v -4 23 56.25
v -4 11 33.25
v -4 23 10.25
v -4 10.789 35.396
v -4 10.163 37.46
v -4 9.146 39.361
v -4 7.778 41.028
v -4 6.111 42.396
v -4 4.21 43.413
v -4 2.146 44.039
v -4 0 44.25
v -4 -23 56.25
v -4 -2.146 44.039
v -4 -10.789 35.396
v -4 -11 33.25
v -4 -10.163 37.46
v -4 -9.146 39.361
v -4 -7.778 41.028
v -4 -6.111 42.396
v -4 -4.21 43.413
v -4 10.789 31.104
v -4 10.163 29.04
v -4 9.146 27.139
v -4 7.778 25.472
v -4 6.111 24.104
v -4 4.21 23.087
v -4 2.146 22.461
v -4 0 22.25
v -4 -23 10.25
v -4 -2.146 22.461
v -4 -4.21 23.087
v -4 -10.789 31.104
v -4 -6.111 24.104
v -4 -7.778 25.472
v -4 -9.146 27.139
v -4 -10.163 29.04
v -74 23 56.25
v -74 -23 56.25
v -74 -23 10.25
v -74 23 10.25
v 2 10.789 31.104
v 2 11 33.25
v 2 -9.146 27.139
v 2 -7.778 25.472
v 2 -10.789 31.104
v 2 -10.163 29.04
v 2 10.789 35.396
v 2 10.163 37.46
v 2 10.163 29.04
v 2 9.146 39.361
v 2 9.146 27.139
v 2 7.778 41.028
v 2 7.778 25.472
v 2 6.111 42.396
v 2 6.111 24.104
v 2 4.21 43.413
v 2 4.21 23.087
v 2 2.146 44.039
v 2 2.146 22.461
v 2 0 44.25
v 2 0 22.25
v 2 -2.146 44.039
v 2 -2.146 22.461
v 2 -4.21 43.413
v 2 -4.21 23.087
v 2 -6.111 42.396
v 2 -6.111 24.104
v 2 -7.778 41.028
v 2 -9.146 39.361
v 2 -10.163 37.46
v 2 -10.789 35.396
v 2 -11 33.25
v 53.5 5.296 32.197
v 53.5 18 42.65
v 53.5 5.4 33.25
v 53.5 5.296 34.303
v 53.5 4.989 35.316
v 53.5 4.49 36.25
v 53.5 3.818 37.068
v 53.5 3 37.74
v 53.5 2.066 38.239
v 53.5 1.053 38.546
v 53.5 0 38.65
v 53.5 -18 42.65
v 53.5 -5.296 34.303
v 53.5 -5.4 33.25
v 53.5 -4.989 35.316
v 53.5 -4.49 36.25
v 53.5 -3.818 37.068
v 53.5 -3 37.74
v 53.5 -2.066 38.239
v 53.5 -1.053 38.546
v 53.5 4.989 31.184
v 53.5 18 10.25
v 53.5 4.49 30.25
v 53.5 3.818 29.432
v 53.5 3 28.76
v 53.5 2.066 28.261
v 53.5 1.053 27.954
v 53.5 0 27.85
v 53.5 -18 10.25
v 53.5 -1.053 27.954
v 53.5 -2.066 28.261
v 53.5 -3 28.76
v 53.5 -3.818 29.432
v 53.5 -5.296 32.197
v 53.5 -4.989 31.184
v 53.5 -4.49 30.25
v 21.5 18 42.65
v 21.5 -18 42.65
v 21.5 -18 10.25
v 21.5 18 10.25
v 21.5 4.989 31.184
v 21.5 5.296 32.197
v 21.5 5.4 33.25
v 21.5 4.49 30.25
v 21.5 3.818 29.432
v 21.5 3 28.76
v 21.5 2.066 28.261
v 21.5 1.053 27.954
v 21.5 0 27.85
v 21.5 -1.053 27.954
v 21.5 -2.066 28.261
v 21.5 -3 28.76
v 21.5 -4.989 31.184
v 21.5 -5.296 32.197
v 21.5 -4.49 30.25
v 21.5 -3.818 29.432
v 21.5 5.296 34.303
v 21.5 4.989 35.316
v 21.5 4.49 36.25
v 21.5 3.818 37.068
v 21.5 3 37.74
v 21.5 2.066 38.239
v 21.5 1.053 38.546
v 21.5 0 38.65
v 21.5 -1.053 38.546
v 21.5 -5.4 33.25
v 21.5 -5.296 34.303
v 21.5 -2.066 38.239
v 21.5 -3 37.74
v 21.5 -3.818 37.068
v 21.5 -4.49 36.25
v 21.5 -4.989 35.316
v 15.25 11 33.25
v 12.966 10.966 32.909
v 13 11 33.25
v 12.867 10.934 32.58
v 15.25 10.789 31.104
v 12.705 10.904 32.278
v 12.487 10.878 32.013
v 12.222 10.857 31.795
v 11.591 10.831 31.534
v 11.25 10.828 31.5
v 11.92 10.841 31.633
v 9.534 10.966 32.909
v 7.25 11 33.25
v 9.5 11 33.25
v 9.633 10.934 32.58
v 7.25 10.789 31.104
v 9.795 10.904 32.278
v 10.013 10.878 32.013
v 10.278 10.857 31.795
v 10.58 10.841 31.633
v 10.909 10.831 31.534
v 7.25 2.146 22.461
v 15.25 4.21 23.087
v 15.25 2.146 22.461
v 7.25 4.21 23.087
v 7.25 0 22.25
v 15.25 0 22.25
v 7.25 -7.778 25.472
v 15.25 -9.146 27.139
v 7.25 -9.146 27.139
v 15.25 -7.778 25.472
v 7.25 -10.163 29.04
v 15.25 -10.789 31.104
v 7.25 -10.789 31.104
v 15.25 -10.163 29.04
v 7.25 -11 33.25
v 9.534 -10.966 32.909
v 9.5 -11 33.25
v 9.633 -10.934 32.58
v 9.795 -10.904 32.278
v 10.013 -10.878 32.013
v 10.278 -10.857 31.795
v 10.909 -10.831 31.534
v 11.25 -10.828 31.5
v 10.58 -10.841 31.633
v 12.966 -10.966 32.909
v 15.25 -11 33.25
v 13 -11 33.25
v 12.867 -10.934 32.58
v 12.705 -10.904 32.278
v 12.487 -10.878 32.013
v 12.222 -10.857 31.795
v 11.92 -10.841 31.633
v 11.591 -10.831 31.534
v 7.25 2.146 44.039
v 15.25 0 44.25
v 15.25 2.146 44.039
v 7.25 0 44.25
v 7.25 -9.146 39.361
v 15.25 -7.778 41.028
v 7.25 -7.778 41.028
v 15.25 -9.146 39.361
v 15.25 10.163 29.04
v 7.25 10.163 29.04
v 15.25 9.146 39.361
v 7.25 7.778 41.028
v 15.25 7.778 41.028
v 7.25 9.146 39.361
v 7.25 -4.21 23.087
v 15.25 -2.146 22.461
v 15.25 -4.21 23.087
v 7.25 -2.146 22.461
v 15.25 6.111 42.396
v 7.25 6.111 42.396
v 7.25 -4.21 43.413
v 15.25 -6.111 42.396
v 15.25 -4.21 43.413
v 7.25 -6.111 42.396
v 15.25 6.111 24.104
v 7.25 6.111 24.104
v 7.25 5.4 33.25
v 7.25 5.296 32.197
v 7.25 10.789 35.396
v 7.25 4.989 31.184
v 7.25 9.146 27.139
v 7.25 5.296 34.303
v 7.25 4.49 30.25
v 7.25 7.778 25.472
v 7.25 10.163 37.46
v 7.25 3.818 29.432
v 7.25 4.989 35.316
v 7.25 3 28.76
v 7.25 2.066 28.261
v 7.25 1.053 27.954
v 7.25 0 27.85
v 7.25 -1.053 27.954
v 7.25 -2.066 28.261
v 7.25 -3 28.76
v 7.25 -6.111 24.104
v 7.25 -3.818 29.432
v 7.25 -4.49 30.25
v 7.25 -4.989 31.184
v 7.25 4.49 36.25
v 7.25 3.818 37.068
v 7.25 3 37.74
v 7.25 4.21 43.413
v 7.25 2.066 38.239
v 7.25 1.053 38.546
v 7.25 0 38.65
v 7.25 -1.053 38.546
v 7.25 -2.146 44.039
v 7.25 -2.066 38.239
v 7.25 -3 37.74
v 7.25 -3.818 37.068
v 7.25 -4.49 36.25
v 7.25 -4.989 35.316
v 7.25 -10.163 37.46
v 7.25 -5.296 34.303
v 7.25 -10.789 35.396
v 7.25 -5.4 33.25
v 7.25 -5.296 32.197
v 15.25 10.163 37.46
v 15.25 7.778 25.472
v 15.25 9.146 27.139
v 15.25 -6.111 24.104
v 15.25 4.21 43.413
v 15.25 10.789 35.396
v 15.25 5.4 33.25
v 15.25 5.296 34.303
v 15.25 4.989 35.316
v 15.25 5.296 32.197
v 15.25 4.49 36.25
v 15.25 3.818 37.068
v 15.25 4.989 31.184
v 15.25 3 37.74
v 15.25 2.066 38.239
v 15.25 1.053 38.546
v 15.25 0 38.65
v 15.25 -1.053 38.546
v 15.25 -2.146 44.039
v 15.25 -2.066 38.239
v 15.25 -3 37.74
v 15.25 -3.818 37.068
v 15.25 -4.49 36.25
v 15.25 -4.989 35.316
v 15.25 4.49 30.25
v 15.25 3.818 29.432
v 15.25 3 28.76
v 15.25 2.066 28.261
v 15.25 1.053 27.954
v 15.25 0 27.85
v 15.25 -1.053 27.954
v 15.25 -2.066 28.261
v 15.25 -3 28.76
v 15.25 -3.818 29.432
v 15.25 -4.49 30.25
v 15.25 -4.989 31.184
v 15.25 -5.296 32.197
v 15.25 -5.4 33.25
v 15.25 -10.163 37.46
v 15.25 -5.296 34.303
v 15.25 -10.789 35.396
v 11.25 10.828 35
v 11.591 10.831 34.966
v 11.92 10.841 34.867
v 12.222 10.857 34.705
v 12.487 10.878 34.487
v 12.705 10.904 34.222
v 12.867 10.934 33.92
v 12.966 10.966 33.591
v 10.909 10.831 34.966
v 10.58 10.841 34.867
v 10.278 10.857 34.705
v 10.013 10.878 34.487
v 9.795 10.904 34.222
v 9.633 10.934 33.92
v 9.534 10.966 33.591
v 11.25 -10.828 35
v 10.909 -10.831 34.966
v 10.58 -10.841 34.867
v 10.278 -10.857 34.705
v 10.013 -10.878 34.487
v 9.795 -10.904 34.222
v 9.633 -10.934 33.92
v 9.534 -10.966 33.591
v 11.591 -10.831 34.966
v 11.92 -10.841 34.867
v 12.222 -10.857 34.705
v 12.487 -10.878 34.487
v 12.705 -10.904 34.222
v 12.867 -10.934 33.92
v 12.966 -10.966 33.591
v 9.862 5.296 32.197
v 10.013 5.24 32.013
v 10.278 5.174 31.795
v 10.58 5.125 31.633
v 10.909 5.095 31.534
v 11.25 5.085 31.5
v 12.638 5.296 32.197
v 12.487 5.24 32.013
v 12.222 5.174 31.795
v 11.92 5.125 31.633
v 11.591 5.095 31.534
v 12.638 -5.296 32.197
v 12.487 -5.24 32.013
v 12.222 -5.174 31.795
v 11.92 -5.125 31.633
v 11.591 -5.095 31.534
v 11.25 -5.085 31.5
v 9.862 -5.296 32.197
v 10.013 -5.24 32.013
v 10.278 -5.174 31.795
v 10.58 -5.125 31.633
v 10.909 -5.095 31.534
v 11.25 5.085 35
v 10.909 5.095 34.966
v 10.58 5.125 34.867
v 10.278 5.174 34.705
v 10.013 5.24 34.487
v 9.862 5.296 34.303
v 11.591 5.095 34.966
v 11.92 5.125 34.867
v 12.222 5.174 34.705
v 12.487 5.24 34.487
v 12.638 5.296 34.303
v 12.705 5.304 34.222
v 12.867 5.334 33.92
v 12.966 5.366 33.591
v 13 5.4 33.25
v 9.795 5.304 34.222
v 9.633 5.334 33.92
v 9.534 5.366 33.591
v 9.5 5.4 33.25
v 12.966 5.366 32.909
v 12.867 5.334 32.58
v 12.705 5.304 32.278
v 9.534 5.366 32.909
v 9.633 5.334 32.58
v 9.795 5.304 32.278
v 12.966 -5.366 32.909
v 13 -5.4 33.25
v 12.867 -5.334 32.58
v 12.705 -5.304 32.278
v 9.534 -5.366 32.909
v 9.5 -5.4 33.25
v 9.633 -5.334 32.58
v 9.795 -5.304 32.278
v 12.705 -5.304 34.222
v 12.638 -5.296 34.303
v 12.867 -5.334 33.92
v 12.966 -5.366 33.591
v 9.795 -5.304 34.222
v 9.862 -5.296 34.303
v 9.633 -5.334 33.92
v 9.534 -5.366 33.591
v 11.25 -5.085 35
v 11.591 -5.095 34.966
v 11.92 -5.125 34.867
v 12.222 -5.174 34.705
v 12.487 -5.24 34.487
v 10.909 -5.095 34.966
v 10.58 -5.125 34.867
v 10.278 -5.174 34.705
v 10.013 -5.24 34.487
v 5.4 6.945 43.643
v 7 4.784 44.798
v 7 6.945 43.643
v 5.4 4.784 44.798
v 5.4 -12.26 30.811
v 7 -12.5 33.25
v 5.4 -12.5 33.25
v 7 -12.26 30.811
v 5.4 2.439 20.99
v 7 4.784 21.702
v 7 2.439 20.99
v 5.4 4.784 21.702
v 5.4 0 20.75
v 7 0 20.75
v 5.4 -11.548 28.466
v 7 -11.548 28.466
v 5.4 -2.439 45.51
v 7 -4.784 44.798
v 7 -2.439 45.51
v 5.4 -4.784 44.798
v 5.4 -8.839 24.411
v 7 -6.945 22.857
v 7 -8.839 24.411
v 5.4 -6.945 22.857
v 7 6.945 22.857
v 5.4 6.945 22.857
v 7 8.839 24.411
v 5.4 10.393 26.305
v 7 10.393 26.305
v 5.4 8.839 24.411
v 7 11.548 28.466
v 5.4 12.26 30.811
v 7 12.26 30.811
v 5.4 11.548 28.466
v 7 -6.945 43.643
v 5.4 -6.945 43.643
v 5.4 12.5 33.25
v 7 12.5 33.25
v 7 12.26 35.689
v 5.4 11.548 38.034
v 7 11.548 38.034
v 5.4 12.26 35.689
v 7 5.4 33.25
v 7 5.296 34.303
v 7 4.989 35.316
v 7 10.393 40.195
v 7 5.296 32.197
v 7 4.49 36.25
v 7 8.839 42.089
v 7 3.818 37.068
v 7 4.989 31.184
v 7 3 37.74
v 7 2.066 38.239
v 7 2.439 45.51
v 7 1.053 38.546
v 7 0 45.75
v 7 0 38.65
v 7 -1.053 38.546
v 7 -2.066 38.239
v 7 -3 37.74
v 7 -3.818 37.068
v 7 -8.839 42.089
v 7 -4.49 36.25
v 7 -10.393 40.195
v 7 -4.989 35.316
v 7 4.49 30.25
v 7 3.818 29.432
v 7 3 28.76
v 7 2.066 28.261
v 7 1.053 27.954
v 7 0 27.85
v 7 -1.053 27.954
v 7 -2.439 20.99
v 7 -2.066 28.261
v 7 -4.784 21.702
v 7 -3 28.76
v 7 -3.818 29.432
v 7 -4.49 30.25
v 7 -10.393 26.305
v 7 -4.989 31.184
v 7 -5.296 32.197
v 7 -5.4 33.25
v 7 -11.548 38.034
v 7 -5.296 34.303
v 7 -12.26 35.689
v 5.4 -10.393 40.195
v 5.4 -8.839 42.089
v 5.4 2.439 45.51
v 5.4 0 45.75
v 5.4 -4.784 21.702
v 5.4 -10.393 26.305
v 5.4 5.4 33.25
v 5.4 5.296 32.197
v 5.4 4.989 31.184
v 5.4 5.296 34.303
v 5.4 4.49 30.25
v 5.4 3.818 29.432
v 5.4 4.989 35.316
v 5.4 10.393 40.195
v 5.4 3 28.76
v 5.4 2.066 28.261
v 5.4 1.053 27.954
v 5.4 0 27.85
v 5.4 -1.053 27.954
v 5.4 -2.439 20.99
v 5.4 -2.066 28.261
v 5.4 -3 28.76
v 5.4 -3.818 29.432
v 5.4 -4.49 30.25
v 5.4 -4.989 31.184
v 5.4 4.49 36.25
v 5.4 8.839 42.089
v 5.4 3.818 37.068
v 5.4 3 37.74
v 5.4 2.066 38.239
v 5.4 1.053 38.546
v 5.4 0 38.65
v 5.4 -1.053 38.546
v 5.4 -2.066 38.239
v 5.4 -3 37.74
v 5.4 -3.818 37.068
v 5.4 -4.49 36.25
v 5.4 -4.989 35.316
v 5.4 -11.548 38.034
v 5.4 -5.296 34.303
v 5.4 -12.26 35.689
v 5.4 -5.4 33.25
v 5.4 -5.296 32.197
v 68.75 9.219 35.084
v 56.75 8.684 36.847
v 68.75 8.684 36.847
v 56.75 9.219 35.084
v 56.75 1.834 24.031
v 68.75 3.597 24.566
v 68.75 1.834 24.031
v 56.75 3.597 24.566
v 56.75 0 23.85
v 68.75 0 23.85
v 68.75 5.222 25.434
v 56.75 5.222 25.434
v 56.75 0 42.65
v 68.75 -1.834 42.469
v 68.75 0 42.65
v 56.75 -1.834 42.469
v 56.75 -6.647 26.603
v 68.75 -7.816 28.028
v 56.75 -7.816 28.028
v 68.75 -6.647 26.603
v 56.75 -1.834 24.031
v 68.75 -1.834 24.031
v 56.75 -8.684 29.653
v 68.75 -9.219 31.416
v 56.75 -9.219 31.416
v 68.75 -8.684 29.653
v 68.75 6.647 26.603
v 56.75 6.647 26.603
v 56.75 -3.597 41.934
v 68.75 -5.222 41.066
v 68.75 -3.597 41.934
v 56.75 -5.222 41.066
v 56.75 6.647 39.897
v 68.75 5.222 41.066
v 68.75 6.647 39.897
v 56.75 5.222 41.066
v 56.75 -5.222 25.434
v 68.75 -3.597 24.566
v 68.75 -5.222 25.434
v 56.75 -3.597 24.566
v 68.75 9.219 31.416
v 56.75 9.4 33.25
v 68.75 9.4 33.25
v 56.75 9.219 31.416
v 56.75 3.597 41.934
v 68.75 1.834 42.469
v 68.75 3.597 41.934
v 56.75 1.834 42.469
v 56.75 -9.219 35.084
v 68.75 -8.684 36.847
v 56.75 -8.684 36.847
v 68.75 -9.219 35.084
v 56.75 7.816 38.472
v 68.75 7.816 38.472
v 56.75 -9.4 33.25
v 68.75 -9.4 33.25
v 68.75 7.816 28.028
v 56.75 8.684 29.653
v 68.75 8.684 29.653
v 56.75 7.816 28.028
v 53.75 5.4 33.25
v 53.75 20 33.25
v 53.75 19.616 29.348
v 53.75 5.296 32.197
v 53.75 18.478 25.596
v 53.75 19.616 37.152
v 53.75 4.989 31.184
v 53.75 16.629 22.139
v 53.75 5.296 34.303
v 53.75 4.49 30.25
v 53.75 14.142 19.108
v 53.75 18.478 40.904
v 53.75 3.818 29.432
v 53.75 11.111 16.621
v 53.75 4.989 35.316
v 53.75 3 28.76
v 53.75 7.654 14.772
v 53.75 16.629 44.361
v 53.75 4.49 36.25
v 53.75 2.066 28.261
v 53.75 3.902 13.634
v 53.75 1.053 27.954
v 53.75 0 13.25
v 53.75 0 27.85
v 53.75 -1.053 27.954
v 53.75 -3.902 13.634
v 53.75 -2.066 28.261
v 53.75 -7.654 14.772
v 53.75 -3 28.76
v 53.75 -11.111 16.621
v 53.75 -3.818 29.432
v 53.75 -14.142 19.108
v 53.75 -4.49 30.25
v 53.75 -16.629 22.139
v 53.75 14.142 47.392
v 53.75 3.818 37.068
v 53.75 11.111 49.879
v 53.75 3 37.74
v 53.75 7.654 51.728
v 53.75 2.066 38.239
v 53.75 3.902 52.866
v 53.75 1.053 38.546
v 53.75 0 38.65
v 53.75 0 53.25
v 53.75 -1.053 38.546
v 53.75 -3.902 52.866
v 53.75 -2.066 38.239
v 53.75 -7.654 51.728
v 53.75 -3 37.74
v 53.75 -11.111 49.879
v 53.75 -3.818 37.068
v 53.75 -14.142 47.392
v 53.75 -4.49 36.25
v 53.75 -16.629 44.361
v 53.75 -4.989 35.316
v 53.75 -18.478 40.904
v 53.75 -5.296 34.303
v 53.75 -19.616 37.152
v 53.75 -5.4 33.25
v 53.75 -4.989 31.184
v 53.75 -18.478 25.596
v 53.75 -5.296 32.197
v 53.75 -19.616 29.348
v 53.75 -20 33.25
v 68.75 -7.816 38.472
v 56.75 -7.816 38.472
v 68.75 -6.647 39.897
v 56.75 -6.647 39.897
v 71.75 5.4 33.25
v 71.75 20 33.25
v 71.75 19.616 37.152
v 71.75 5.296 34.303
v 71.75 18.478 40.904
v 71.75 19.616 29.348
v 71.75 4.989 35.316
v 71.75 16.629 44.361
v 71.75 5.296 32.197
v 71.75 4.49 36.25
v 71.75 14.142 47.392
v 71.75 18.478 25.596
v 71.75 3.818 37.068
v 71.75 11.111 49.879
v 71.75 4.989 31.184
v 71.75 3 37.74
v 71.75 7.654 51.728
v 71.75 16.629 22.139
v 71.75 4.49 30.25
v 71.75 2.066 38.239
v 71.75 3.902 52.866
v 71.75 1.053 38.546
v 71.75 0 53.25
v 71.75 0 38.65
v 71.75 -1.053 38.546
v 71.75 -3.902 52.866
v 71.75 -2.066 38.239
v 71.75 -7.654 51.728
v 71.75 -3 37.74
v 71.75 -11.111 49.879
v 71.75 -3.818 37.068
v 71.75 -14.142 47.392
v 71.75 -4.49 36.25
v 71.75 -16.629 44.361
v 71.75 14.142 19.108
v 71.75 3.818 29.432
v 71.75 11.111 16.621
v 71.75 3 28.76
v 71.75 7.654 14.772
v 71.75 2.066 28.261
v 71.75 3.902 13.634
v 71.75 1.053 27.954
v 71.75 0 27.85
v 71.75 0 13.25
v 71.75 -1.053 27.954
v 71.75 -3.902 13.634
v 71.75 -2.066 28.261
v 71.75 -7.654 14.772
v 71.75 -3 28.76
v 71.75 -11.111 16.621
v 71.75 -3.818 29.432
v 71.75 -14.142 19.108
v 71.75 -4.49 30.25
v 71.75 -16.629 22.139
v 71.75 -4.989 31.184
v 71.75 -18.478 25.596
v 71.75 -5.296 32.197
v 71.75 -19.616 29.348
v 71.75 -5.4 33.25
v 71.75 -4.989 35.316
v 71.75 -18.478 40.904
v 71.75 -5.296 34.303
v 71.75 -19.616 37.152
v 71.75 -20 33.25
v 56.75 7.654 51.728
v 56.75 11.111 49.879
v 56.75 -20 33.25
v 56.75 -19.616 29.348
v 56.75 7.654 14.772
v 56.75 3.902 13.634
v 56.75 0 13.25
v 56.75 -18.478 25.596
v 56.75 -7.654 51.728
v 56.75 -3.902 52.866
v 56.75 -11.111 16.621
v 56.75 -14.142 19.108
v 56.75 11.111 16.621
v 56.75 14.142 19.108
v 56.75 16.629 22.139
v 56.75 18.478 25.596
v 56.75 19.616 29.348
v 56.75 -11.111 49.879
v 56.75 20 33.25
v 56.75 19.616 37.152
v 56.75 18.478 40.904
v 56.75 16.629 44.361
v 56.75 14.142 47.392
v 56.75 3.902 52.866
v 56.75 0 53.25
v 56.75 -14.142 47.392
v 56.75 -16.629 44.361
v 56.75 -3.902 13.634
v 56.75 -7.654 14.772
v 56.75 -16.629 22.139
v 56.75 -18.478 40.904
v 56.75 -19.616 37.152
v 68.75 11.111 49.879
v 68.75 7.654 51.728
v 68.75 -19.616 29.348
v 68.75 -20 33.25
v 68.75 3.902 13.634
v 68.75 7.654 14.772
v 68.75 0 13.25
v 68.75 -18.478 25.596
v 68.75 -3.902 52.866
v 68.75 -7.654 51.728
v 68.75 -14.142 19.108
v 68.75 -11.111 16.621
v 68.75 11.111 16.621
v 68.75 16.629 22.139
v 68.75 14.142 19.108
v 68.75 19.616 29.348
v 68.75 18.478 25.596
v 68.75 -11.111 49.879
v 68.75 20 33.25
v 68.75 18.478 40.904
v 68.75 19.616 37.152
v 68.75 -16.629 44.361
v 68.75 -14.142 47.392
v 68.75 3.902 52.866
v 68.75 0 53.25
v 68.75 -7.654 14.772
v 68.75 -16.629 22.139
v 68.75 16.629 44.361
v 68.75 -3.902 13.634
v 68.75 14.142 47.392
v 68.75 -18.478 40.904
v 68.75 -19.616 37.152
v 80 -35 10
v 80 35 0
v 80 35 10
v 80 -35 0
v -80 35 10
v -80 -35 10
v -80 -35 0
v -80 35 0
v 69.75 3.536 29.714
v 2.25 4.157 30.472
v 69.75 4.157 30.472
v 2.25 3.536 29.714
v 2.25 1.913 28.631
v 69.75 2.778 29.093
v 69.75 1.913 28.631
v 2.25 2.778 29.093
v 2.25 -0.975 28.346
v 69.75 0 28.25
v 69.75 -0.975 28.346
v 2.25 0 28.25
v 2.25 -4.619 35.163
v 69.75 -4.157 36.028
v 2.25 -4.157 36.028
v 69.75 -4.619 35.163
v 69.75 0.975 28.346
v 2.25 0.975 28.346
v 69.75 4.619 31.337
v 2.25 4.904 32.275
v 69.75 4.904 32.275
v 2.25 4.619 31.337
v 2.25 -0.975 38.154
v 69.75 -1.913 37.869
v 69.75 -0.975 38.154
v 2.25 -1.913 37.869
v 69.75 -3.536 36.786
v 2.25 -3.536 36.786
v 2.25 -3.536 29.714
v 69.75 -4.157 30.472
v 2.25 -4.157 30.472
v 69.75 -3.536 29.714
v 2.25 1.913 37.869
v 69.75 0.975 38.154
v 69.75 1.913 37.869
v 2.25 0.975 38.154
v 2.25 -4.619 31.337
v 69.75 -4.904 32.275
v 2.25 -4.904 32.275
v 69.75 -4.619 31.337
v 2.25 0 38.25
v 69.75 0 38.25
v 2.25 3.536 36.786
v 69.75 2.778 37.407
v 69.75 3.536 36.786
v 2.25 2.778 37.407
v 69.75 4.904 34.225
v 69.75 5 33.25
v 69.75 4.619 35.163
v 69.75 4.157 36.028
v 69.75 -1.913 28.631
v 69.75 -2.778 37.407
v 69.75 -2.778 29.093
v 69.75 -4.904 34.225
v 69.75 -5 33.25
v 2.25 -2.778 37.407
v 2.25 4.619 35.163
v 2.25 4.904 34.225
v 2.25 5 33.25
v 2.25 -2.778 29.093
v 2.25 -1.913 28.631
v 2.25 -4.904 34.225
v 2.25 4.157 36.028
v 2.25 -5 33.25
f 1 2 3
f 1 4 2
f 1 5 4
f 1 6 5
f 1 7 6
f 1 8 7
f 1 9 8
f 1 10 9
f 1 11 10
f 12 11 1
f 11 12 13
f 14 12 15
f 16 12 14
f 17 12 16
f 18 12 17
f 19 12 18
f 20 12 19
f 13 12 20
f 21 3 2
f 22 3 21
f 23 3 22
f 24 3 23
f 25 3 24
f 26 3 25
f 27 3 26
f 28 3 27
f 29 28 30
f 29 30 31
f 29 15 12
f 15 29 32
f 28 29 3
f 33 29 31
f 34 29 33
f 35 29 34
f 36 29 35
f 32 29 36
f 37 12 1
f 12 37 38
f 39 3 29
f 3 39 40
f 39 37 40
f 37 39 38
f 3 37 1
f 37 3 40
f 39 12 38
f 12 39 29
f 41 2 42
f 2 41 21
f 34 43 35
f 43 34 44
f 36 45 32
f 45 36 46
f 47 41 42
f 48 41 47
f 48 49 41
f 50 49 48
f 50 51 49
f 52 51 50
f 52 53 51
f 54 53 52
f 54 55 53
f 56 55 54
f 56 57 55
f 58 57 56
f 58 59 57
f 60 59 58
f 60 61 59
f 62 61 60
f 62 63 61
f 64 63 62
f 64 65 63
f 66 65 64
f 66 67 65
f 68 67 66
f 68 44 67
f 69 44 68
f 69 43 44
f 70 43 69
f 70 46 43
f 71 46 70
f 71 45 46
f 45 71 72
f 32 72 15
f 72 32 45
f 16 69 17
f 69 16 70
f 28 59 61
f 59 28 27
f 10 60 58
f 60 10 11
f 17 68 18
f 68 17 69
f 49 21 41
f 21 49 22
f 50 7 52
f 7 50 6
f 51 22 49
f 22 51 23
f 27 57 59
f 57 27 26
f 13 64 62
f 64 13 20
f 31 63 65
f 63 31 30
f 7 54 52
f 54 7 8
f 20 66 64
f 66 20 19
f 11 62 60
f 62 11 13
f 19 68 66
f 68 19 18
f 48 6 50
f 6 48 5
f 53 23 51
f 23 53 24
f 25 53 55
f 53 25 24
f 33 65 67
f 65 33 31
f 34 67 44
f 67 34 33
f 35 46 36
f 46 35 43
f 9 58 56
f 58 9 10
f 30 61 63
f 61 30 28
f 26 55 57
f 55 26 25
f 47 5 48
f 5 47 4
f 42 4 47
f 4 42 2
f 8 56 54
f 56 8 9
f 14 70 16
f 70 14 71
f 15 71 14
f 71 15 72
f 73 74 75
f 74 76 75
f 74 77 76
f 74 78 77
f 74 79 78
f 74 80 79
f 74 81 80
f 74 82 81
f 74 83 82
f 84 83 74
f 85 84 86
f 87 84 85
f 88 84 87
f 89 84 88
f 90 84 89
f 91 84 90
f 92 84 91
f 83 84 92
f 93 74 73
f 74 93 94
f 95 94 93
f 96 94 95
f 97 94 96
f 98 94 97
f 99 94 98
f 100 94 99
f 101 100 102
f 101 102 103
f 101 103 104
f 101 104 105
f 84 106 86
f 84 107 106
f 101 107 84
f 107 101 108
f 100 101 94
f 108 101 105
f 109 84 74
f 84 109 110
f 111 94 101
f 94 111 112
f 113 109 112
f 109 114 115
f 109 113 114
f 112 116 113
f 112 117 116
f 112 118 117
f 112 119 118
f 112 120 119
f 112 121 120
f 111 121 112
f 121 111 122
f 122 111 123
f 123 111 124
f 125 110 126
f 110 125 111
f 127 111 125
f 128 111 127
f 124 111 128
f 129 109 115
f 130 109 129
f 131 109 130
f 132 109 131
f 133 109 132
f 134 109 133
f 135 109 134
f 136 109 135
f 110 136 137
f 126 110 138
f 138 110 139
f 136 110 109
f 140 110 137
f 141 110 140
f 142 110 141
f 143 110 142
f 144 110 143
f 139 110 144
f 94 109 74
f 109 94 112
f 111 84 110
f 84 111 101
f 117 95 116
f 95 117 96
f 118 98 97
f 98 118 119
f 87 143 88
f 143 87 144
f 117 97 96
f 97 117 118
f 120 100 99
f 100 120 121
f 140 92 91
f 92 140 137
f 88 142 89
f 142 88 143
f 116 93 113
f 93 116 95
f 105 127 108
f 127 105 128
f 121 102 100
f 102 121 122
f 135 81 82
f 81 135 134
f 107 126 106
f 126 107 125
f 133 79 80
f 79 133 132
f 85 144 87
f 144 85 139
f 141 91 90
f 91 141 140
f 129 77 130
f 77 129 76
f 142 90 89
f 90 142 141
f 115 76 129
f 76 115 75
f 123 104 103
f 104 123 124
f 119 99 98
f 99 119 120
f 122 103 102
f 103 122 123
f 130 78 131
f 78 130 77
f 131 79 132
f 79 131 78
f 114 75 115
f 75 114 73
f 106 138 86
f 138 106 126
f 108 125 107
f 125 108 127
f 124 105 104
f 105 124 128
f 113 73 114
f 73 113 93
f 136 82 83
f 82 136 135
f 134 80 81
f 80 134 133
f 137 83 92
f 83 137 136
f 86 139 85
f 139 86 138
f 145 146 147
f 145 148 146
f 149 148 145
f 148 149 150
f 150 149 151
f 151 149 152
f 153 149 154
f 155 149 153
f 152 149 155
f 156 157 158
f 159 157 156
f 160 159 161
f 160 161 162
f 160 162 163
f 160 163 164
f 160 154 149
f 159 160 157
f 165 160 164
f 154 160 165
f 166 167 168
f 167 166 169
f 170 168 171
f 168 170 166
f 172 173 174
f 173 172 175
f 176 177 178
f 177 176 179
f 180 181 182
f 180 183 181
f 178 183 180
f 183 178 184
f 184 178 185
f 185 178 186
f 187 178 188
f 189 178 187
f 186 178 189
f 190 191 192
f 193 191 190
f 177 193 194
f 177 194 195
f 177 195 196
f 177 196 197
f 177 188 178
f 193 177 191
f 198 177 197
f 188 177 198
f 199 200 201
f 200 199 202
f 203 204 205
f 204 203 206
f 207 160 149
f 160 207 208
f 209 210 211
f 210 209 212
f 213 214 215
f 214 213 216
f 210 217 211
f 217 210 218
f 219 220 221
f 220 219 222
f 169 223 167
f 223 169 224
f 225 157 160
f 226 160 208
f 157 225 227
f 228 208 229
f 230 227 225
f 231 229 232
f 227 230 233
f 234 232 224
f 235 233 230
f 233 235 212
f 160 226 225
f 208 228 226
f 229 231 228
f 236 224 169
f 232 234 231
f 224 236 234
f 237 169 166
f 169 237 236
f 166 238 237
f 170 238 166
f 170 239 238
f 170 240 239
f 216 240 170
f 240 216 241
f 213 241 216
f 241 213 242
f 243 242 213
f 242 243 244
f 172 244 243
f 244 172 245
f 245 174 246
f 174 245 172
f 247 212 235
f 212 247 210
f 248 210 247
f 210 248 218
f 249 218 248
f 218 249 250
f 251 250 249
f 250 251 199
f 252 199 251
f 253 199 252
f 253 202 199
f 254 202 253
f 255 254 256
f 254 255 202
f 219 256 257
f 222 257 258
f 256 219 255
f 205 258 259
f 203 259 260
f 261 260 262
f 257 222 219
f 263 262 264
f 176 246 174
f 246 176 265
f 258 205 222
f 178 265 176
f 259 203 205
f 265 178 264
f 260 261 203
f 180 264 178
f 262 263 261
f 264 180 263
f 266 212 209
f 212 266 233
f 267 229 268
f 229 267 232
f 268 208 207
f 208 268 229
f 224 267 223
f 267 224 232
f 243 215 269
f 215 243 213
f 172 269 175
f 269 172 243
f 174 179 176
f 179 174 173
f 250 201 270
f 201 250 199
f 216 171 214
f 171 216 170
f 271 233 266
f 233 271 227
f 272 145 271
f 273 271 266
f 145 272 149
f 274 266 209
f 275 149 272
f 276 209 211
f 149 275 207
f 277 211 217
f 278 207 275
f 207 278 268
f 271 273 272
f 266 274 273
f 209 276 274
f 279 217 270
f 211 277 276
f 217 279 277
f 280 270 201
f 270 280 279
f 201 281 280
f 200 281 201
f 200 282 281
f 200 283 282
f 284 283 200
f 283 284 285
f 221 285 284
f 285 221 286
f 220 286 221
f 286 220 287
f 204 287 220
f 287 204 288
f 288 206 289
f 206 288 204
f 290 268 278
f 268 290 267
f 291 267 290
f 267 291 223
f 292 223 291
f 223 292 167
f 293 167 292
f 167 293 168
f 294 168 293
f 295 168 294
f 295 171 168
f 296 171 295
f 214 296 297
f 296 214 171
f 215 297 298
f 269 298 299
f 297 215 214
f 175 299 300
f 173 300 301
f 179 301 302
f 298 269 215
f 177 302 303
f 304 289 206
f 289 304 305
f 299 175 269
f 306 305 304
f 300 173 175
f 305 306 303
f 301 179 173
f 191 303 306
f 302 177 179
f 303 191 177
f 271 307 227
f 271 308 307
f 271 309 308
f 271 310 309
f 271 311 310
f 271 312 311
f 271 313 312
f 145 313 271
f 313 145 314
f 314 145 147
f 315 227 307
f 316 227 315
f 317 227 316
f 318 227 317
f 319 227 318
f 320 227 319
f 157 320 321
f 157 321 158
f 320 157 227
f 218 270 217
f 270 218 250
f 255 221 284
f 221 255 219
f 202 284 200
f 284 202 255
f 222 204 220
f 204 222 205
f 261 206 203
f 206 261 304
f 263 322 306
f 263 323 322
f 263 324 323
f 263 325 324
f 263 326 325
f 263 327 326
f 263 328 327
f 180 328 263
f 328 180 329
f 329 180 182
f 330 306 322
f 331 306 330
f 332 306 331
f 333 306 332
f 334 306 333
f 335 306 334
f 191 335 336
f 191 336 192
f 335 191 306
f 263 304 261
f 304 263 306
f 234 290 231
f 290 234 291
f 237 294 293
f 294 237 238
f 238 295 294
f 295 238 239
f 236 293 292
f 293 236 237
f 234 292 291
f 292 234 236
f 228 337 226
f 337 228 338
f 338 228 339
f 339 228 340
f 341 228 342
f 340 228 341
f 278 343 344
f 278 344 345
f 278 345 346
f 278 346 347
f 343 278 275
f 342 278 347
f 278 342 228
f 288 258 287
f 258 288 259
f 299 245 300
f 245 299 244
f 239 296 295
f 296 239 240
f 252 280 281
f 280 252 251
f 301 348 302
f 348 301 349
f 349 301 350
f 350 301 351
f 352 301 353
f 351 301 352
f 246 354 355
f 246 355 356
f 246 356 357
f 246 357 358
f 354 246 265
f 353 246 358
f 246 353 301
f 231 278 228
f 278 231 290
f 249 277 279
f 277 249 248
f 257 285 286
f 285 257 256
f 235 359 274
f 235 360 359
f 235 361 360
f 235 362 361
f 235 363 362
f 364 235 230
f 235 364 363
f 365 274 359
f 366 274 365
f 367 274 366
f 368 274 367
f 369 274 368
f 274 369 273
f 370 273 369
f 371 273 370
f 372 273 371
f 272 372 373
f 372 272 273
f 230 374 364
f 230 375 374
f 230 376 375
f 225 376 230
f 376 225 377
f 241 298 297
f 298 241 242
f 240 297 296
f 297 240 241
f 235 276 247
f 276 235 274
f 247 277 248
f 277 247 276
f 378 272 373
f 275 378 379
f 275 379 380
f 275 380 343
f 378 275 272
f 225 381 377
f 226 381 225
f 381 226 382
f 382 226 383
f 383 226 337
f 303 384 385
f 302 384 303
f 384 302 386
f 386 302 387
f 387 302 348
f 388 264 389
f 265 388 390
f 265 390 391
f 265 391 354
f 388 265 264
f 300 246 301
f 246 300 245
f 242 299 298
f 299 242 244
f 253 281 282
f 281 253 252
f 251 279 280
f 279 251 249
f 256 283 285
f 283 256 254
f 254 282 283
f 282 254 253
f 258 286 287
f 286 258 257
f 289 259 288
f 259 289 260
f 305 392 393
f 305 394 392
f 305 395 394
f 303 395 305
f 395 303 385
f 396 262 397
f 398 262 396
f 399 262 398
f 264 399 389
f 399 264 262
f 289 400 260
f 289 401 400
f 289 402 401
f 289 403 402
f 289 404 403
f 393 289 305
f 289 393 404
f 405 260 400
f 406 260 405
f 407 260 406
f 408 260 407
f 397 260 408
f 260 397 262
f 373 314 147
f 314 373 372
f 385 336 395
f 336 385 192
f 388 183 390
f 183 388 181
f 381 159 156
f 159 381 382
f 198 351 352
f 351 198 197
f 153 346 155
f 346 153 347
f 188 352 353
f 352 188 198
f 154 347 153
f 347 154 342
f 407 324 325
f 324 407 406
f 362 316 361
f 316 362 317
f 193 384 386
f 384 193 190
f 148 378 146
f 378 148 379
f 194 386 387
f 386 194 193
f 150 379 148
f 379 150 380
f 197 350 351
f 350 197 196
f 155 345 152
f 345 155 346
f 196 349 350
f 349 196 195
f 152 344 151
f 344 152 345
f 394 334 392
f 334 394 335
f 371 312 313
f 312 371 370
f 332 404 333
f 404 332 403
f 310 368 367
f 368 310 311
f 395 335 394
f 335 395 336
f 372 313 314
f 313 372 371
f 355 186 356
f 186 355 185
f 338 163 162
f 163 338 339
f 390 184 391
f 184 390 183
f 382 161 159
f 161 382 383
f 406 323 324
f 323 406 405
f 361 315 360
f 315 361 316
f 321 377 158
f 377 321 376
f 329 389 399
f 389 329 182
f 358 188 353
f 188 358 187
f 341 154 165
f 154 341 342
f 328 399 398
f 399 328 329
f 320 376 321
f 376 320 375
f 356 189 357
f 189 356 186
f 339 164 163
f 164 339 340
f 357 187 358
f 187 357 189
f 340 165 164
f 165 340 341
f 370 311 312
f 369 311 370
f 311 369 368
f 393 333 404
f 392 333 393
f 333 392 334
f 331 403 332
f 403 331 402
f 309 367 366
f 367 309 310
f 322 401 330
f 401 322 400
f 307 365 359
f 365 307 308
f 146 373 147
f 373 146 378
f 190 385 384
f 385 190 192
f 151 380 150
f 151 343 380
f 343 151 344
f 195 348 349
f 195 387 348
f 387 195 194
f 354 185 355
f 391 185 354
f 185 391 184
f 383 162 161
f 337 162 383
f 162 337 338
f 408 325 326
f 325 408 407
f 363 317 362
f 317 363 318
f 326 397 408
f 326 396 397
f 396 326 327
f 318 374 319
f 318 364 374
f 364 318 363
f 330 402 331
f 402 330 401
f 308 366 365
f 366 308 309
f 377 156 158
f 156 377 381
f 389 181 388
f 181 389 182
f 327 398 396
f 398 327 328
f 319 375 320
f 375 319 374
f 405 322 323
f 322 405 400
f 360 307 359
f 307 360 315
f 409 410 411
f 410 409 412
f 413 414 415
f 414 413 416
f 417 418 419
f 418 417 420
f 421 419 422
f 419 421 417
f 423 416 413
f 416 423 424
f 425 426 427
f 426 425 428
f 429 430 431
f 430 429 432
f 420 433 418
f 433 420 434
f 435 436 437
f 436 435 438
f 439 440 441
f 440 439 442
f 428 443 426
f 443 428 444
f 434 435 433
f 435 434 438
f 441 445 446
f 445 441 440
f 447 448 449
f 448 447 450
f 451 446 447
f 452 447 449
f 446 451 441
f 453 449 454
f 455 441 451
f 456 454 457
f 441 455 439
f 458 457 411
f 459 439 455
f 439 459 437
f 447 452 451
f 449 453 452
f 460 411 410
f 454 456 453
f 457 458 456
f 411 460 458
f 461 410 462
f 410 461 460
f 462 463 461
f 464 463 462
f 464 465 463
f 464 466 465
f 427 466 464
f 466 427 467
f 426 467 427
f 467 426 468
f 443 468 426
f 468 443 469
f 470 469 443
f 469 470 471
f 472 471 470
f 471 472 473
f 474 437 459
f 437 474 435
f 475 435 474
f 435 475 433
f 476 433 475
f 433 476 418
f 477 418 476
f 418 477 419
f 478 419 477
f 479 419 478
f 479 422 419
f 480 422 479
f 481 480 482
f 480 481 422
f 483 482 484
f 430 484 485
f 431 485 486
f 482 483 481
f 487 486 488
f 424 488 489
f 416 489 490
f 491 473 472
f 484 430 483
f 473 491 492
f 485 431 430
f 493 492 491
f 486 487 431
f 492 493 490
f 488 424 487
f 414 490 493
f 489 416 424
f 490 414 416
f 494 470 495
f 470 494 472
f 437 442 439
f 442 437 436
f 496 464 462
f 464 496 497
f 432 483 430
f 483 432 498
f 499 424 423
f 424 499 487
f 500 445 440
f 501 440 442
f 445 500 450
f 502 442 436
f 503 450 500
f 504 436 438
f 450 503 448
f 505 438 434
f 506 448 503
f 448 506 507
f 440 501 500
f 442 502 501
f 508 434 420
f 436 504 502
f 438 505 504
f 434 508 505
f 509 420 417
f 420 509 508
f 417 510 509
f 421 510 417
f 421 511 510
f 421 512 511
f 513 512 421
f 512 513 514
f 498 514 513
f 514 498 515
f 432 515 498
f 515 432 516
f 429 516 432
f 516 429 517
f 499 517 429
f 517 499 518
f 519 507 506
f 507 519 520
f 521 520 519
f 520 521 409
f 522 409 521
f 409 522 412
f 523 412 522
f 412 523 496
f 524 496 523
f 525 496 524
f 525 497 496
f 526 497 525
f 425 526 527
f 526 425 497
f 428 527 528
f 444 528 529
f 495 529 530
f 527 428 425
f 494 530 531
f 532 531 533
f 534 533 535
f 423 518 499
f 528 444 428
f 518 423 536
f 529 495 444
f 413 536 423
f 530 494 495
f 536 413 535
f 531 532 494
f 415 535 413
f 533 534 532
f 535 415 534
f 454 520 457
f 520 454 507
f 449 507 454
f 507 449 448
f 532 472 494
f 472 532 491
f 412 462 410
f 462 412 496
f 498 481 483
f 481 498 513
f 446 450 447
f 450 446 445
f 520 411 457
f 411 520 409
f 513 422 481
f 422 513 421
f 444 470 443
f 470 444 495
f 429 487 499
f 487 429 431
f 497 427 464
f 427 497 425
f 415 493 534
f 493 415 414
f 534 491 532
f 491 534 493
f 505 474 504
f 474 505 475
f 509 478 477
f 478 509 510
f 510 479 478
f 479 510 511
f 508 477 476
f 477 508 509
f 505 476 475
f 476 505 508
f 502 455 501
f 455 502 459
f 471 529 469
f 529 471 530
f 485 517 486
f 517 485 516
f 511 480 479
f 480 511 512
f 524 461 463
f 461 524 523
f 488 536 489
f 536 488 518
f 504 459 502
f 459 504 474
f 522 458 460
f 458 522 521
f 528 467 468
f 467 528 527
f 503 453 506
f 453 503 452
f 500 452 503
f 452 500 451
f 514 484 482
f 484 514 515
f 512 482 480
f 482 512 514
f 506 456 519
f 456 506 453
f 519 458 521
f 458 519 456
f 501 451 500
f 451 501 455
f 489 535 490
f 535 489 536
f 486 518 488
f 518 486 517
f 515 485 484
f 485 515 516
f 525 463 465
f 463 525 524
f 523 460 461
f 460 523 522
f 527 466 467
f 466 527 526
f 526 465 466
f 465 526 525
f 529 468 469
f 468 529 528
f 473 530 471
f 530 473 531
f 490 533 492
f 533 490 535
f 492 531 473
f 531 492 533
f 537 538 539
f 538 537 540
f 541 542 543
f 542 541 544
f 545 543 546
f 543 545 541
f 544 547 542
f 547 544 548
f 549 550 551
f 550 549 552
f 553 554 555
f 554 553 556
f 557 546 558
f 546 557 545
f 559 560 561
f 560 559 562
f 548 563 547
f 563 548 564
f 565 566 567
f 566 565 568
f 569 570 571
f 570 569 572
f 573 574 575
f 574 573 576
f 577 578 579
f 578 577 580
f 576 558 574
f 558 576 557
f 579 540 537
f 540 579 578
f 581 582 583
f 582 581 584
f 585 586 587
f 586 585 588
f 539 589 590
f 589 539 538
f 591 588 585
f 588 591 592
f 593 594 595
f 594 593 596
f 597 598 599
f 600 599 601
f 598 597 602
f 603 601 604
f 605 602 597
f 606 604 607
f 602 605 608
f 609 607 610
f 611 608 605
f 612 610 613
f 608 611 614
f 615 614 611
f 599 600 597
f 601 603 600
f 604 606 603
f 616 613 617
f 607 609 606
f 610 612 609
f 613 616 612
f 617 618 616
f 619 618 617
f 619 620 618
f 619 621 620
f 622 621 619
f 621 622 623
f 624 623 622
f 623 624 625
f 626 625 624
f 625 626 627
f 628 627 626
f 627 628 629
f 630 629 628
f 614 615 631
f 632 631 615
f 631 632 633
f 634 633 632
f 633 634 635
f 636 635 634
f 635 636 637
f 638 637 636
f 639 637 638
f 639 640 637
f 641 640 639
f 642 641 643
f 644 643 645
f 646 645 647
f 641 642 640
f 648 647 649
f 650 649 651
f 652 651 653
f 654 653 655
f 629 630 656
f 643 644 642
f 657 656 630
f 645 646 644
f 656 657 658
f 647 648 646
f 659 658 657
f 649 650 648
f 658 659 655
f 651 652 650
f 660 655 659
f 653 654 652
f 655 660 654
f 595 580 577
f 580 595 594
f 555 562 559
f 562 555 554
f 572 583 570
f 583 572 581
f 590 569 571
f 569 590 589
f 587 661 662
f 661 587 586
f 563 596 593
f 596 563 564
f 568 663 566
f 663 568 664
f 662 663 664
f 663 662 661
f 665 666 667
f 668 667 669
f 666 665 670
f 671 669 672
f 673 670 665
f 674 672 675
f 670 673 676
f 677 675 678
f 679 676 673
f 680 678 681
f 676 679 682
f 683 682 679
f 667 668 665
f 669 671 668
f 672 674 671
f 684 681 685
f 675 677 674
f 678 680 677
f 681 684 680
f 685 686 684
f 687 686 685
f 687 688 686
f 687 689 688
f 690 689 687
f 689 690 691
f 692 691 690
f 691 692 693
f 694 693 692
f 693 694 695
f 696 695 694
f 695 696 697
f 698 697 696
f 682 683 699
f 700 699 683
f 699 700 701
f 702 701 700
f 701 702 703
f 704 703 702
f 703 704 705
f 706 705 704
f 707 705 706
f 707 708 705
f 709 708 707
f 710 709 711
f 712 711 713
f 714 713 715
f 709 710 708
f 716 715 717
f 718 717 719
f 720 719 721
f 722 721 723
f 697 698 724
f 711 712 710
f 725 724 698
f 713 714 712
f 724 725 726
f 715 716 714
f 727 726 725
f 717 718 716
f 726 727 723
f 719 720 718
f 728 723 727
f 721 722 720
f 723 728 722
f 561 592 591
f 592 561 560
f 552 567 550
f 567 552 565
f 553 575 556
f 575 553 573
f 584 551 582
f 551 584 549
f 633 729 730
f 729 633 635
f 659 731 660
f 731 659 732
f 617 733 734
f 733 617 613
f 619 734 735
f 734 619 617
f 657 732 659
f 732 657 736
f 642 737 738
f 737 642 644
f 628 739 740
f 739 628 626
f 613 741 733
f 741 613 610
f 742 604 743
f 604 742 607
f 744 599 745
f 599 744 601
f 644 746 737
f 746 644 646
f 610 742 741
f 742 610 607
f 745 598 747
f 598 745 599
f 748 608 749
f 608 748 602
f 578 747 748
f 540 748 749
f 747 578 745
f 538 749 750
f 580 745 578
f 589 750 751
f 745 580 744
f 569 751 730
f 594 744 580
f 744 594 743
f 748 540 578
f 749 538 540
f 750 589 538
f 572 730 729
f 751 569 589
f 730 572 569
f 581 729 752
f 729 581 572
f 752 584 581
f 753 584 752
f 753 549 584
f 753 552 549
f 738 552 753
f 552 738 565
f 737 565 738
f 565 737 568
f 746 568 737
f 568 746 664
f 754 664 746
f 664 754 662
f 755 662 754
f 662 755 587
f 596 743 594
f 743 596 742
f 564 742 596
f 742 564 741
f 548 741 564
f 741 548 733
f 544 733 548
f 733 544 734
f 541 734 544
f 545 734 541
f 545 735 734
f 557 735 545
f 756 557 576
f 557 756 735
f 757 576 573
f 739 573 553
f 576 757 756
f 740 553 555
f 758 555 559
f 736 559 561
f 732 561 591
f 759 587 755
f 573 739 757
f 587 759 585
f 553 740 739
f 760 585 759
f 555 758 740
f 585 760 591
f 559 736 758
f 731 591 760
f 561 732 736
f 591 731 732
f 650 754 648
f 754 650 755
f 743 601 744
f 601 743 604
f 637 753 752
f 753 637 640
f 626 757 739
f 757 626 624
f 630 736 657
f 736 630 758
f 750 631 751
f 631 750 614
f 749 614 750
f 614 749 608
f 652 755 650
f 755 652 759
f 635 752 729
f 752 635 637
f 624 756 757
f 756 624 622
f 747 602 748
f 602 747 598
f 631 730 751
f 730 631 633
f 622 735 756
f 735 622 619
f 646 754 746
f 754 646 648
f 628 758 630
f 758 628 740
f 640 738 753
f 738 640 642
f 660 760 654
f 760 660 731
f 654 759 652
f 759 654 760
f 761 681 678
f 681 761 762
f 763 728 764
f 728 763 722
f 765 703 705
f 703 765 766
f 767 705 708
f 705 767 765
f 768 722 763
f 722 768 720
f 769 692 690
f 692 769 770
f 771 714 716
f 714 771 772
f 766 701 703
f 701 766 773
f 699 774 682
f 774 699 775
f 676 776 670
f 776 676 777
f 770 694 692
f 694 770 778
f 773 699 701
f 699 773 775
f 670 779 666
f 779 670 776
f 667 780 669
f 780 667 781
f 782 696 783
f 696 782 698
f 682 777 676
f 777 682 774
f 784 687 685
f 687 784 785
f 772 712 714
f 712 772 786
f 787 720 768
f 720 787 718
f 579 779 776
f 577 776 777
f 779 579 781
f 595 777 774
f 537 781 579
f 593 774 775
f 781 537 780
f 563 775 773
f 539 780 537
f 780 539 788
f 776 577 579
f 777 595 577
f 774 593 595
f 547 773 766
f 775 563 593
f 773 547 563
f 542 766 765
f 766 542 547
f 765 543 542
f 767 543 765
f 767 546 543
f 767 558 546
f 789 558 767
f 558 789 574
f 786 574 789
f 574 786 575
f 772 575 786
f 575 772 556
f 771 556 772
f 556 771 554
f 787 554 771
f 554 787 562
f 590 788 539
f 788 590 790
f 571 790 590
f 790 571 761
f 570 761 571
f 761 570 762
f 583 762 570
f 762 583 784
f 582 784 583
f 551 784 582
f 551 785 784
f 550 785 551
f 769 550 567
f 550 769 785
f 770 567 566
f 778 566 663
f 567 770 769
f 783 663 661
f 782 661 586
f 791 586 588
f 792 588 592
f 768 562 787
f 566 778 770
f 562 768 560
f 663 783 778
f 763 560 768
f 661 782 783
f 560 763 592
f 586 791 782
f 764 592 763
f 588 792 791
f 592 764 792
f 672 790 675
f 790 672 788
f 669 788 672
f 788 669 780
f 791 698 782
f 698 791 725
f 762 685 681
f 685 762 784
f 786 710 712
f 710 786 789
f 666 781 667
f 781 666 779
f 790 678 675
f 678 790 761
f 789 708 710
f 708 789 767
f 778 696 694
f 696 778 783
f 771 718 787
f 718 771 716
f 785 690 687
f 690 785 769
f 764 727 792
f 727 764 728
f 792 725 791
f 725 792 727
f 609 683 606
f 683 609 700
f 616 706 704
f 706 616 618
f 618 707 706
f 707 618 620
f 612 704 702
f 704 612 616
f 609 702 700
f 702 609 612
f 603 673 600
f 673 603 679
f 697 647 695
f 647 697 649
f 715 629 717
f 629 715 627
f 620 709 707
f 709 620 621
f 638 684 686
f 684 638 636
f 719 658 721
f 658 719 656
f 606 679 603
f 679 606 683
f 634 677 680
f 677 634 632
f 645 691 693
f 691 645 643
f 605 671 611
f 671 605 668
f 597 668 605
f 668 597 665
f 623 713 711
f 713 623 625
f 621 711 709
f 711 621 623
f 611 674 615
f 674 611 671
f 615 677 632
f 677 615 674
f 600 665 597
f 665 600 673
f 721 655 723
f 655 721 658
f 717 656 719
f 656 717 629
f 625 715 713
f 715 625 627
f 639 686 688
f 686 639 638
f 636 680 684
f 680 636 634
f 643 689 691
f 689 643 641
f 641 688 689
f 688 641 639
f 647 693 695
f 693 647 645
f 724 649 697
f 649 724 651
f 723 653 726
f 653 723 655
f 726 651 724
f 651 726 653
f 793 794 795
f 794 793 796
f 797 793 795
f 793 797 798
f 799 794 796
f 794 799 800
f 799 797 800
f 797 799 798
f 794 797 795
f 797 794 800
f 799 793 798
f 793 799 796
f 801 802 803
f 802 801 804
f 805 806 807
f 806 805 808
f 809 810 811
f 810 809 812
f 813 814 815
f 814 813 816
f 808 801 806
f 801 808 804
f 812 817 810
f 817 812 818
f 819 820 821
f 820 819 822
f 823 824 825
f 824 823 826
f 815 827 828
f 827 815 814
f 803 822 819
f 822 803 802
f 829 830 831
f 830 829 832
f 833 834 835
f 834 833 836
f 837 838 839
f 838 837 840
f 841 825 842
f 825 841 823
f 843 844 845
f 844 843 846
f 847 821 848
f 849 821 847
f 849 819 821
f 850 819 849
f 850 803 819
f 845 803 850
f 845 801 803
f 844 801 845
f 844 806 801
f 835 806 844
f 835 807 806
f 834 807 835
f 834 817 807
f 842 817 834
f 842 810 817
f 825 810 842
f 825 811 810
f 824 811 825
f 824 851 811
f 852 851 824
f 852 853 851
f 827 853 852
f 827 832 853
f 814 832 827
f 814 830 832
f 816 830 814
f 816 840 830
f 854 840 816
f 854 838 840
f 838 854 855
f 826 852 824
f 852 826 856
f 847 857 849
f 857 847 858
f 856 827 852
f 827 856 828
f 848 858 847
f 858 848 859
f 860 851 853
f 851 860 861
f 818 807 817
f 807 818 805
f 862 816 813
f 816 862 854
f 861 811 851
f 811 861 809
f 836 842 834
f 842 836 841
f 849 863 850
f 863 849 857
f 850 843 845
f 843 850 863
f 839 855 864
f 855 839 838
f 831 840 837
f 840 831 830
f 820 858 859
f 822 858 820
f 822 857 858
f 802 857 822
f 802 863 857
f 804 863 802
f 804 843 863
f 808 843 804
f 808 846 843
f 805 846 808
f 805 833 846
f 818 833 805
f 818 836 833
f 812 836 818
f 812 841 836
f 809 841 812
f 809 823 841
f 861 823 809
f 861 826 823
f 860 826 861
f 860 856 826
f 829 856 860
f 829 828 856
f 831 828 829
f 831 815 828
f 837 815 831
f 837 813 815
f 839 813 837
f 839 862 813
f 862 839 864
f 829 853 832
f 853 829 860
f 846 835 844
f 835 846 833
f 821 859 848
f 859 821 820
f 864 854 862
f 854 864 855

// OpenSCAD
$fn = 32;

// ------------------------------------------------------------------------
// Motor drive station: motor 70 x 46 mm, shaft d10, pulley d40
// Every part is its own module, assembly() places every instance.
// ------------------------------------------------------------------------

// --- part 1 ---
module station_bed() {
  difference() {
    translate([-80, -35, 0]) cube([160, 70, 10]);
  }
}

// --- part 2 ---
module drive_motor() {
  union() {
    translate([-35, -23, 0]) cube([70, 46, 46]);
    translate([38, 0, 23]) rotate([0, 90, 0]) cylinder(h = 6, d = 22, center = true);
  }
}

// --- part 3 ---
module pillow_block() {
  difference() {
    translate([-16, -18, 0]) cube([32, 36, 32.4]);
    translate([0, 0, 23]) rotate([0, 90, 0]) cylinder(h = 34, d = 10.8, center = true);
  }
}

// --- part 4 ---
module drive_shaft() {
  translate([0, 0, -33.75]) cylinder(h = 67.5, d = 10);
}

// --- part 5 ---
module shaft_collar() {
  difference() {
    cylinder(h = 8, d = 22);
    translate([0, 0, -1]) cylinder(h = 10, d = 10.8);
    translate([0, 0, 4]) rotate([90, 0, 0]) cylinder(h = 24, d = 3.5, center = true);
  }
}

// --- part 6 ---
module collar_washer() {
  difference() {
      translate([0, 0, 0]) cylinder(h = 1.6, d = 25);
      translate([0, 0, -1]) cylinder(h = 3.6, d = 10.8);
    }
}

// --- part 7 ---
module drive_pulley() {
  difference() {
    union() {
      cylinder(h = 18, d = 18.8);
      cylinder(h = 3, d = 40);
      translate([0, 0, 15]) cylinder(h = 3, d = 40);
    }
    translate([0, 0, -1]) cylinder(h = 20, d = 10.8);
  }
}

// --- assembly ---
module assembly() {
  color([0.80, 0.24, 0.20]) translate([0, 0, 0]) rotate([0, 0, 0]) station_bed();
  color([0.20, 0.45, 0.75]) translate([-39, 0, 10.25]) rotate([0, 0, 0]) drive_motor();
  color([0.25, 0.62, 0.32]) translate([37.5, 0, 10.25]) rotate([0, 0, 0]) pillow_block();
  color([0.92, 0.70, 0.18]) translate([36, 0, 33.25]) rotate([0, 90, 0]) drive_shaft();
  color([0.58, 0.35, 0.70]) translate([7.25, 0, 33.25]) rotate([0, 90, 0]) shaft_collar();
  color([0.16, 0.66, 0.66]) translate([5.4, 0, 33.25]) rotate([0, 90, 0]) collar_washer();
  color([0.85, 0.48, 0.18]) translate([53.75, 0, 33.25]) rotate([0, 90, 0]) drive_pulley();
}

assembly();
